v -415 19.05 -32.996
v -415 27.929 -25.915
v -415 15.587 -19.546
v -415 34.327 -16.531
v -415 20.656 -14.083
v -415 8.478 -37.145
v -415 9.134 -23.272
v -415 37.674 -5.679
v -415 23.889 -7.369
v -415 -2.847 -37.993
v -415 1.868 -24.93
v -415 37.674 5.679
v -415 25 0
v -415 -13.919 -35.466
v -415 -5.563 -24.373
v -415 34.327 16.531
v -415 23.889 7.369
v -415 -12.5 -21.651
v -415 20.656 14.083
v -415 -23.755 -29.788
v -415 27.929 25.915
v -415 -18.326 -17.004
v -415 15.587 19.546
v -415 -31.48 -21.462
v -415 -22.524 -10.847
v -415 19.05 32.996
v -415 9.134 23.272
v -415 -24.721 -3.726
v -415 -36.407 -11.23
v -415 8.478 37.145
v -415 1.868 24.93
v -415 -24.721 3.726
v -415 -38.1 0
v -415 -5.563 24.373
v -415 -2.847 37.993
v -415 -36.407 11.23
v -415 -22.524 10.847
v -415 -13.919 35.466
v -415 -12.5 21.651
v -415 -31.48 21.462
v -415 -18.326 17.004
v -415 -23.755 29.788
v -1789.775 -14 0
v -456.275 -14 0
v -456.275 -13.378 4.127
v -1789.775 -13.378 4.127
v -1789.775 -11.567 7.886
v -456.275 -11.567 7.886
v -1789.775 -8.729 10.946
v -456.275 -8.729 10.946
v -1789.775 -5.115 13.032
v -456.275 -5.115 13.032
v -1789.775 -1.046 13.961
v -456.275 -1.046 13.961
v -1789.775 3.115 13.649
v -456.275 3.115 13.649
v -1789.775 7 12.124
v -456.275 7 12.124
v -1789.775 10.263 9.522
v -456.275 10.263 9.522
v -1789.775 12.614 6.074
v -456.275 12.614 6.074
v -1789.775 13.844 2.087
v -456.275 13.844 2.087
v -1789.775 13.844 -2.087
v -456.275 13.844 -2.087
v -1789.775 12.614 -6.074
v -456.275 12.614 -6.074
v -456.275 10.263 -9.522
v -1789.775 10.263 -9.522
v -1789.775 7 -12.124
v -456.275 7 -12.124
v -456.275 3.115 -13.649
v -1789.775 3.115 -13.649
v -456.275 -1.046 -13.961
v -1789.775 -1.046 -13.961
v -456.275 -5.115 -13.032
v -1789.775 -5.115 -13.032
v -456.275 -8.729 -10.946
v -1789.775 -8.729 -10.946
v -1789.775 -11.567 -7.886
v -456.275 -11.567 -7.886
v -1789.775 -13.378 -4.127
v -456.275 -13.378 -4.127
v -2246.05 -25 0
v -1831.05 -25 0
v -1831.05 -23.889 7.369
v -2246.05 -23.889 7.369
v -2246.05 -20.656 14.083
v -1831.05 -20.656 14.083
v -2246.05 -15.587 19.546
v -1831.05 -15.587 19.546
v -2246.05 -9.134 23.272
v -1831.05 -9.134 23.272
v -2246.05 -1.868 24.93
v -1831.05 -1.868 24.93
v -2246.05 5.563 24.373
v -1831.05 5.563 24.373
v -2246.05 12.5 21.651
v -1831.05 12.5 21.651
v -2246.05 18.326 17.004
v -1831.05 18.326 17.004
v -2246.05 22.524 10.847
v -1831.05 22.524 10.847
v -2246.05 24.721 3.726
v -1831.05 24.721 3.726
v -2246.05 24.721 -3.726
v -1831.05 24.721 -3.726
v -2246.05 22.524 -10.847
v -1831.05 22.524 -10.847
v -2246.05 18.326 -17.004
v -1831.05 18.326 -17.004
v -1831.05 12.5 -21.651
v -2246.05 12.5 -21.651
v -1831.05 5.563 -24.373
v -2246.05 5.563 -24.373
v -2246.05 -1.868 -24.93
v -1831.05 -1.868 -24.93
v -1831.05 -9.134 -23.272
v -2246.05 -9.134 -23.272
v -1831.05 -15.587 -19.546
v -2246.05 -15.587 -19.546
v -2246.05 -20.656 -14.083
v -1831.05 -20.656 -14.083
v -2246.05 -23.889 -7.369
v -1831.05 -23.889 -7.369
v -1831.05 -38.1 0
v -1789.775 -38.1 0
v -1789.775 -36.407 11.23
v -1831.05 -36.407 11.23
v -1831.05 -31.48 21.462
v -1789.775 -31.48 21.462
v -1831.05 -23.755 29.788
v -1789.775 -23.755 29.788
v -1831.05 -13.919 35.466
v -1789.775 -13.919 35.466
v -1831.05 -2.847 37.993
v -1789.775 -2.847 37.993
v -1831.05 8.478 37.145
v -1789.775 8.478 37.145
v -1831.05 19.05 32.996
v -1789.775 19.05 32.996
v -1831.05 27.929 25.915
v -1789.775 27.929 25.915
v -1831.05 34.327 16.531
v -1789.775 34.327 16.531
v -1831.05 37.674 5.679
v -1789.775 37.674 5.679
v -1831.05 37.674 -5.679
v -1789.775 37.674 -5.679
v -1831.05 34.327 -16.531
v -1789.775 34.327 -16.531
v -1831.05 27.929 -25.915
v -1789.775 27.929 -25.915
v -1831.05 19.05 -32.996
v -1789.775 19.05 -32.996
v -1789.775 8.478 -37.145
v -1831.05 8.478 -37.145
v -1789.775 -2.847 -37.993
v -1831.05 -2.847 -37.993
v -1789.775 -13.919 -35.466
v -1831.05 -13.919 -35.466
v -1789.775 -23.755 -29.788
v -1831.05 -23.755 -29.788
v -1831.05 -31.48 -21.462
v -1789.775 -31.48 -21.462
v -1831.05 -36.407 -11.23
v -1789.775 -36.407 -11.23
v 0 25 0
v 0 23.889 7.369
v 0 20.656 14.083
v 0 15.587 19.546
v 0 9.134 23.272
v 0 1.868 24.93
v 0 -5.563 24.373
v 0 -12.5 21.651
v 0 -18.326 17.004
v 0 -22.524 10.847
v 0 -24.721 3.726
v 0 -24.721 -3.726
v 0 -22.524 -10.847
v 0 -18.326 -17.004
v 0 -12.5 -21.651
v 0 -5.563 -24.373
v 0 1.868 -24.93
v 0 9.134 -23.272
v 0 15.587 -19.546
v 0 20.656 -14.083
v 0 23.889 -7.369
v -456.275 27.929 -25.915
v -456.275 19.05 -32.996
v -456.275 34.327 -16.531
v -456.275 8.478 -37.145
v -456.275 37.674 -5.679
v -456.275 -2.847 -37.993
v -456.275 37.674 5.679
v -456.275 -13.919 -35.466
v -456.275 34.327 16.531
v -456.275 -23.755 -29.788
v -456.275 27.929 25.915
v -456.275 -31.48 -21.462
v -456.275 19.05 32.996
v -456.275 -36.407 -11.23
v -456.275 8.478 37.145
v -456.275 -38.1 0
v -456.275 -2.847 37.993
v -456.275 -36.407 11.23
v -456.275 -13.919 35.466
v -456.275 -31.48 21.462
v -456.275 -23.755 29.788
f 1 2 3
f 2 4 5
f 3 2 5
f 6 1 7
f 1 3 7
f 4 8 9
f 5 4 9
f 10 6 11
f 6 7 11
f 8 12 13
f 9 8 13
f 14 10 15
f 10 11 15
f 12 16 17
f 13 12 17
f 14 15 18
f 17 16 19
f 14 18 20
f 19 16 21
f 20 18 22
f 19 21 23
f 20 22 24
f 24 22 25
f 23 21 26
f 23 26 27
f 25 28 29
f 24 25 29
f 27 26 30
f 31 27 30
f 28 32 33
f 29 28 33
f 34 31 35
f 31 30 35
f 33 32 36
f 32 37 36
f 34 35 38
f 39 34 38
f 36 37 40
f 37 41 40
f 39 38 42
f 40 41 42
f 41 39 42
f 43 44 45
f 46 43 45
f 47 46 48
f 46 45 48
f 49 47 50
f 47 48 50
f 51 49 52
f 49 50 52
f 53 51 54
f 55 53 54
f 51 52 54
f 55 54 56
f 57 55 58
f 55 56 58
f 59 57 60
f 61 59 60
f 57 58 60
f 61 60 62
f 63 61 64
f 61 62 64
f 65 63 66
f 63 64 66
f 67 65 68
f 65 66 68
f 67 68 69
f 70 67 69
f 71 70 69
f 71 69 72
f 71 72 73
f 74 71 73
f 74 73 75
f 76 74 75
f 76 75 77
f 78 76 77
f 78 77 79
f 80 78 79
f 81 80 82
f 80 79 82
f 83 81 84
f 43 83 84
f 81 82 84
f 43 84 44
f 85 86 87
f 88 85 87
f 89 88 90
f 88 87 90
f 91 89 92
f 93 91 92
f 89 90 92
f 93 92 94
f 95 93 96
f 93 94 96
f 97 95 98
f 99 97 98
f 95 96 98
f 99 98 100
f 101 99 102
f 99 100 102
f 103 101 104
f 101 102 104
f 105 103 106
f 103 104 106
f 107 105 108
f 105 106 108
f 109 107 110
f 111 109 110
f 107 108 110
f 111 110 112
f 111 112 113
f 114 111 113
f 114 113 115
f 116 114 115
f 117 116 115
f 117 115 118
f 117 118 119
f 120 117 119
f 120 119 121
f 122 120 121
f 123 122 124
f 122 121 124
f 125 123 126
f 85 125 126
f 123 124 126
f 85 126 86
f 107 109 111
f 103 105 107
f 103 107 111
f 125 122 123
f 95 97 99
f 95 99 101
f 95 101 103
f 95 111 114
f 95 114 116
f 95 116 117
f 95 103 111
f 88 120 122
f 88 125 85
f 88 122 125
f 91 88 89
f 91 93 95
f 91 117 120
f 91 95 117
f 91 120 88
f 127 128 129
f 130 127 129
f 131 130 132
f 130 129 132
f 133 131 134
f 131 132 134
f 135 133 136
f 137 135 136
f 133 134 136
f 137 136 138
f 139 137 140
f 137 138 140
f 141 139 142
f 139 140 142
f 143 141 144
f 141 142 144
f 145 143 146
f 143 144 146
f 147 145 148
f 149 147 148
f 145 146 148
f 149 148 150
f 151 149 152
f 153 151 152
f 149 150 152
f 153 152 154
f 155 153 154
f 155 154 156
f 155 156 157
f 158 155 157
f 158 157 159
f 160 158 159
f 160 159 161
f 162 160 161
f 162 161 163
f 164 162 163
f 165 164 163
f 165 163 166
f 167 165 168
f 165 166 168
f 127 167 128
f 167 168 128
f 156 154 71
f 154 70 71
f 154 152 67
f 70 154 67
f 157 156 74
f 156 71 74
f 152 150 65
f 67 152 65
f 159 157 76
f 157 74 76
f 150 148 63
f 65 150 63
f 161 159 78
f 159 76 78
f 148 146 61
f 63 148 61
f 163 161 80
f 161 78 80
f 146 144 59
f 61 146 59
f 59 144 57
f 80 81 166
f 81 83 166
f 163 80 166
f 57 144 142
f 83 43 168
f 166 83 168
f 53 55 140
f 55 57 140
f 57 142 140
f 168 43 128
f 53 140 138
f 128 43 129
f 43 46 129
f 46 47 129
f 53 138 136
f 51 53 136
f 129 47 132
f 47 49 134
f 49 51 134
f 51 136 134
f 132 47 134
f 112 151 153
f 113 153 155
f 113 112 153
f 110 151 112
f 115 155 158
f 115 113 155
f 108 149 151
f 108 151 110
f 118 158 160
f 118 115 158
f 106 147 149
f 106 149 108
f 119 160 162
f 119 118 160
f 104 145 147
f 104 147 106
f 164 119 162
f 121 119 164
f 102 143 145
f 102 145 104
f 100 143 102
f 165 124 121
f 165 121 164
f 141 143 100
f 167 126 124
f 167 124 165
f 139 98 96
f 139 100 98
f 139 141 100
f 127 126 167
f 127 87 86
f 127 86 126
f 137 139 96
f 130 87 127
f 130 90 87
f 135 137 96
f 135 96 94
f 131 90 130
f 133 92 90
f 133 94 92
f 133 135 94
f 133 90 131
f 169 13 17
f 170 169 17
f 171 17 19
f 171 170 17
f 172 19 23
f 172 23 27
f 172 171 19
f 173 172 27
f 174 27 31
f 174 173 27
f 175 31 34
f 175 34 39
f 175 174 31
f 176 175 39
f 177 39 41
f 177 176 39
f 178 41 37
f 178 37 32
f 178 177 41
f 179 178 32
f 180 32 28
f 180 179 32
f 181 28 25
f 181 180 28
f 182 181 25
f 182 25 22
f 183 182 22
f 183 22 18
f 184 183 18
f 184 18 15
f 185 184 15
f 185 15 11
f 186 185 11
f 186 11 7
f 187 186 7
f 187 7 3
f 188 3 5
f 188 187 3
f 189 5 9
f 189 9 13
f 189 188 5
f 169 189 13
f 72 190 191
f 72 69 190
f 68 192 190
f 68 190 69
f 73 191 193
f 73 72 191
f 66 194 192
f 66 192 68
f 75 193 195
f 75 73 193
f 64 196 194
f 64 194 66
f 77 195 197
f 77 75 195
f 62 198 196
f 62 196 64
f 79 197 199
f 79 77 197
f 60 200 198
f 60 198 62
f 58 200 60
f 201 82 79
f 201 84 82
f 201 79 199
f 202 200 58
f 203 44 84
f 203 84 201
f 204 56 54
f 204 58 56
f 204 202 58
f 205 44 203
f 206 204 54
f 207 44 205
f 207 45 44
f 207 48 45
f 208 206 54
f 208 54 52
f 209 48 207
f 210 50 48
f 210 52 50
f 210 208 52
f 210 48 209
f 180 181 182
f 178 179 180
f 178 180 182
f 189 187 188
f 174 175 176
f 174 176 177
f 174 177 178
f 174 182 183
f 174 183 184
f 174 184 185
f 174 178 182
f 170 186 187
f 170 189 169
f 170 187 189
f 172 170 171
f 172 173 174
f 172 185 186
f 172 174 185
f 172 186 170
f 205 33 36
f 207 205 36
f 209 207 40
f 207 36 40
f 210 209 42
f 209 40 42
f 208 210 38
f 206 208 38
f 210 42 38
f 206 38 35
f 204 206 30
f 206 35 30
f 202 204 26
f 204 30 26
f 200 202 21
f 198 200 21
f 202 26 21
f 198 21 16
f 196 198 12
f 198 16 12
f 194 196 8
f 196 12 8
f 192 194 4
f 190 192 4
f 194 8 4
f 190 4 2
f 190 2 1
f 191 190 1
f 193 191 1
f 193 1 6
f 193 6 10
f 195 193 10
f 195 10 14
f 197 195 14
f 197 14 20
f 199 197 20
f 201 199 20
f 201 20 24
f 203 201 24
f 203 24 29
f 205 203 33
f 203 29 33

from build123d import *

# Parameters (mm, degrees)
F0_R     = 25
F1_DEPTH = 415
F2_R     = 38.1
F3_DEPTH = 41.275
F4_R     = 14
F5_DEPTH = 1333.5
F6_R     = 38.1
F7_DEPTH = 41.275
F8_R     = 25
F9_DEPTH = 415


with BuildPart() as f1:
    # F0 (on Right) → F1 (new body)
    with BuildSketch(Plane.YZ):
        Circle(F0_R)
    extrude(amount=-F1_DEPTH)



with BuildPart() as f3:
    # F2 (on face) → F3 (new body)
    with BuildSketch(Plane(origin=(-1789.775, 0, 0), x_dir=(0, -1, 0), z_dir=(-1, 0, 0))):
        Circle(F2_R)
    extrude(amount=F3_DEPTH)

    # F4 (on face) → F5 (join)
    with BuildSketch(Plane(origin=(-456.275, 0, 0), x_dir=(0, -1, 0), z_dir=(-1, 0, 0))):
        Circle(F4_R)
    extrude(amount=F5_DEPTH)


with BuildPart() as f1_1:
    add(f1.part)

    add(f3.part)  # F7 merges F3
    # F6 (on face) → F7 (join)
    with BuildSketch(Plane(origin=(-415, 0, 0), x_dir=(0, -1, 0), z_dir=(-1, 0, 0))):
        Circle(F6_R)
    extrude(amount=F7_DEPTH)

    # F8 (on face) → F9 (join)
    with BuildSketch(Plane(origin=(-1831.05, 0, 0), x_dir=(0, -1, 0), z_dir=(-1, 0, 0))):
        Circle(F8_R)
    extrude(amount=F9_DEPTH)


solid = f1_1.part
